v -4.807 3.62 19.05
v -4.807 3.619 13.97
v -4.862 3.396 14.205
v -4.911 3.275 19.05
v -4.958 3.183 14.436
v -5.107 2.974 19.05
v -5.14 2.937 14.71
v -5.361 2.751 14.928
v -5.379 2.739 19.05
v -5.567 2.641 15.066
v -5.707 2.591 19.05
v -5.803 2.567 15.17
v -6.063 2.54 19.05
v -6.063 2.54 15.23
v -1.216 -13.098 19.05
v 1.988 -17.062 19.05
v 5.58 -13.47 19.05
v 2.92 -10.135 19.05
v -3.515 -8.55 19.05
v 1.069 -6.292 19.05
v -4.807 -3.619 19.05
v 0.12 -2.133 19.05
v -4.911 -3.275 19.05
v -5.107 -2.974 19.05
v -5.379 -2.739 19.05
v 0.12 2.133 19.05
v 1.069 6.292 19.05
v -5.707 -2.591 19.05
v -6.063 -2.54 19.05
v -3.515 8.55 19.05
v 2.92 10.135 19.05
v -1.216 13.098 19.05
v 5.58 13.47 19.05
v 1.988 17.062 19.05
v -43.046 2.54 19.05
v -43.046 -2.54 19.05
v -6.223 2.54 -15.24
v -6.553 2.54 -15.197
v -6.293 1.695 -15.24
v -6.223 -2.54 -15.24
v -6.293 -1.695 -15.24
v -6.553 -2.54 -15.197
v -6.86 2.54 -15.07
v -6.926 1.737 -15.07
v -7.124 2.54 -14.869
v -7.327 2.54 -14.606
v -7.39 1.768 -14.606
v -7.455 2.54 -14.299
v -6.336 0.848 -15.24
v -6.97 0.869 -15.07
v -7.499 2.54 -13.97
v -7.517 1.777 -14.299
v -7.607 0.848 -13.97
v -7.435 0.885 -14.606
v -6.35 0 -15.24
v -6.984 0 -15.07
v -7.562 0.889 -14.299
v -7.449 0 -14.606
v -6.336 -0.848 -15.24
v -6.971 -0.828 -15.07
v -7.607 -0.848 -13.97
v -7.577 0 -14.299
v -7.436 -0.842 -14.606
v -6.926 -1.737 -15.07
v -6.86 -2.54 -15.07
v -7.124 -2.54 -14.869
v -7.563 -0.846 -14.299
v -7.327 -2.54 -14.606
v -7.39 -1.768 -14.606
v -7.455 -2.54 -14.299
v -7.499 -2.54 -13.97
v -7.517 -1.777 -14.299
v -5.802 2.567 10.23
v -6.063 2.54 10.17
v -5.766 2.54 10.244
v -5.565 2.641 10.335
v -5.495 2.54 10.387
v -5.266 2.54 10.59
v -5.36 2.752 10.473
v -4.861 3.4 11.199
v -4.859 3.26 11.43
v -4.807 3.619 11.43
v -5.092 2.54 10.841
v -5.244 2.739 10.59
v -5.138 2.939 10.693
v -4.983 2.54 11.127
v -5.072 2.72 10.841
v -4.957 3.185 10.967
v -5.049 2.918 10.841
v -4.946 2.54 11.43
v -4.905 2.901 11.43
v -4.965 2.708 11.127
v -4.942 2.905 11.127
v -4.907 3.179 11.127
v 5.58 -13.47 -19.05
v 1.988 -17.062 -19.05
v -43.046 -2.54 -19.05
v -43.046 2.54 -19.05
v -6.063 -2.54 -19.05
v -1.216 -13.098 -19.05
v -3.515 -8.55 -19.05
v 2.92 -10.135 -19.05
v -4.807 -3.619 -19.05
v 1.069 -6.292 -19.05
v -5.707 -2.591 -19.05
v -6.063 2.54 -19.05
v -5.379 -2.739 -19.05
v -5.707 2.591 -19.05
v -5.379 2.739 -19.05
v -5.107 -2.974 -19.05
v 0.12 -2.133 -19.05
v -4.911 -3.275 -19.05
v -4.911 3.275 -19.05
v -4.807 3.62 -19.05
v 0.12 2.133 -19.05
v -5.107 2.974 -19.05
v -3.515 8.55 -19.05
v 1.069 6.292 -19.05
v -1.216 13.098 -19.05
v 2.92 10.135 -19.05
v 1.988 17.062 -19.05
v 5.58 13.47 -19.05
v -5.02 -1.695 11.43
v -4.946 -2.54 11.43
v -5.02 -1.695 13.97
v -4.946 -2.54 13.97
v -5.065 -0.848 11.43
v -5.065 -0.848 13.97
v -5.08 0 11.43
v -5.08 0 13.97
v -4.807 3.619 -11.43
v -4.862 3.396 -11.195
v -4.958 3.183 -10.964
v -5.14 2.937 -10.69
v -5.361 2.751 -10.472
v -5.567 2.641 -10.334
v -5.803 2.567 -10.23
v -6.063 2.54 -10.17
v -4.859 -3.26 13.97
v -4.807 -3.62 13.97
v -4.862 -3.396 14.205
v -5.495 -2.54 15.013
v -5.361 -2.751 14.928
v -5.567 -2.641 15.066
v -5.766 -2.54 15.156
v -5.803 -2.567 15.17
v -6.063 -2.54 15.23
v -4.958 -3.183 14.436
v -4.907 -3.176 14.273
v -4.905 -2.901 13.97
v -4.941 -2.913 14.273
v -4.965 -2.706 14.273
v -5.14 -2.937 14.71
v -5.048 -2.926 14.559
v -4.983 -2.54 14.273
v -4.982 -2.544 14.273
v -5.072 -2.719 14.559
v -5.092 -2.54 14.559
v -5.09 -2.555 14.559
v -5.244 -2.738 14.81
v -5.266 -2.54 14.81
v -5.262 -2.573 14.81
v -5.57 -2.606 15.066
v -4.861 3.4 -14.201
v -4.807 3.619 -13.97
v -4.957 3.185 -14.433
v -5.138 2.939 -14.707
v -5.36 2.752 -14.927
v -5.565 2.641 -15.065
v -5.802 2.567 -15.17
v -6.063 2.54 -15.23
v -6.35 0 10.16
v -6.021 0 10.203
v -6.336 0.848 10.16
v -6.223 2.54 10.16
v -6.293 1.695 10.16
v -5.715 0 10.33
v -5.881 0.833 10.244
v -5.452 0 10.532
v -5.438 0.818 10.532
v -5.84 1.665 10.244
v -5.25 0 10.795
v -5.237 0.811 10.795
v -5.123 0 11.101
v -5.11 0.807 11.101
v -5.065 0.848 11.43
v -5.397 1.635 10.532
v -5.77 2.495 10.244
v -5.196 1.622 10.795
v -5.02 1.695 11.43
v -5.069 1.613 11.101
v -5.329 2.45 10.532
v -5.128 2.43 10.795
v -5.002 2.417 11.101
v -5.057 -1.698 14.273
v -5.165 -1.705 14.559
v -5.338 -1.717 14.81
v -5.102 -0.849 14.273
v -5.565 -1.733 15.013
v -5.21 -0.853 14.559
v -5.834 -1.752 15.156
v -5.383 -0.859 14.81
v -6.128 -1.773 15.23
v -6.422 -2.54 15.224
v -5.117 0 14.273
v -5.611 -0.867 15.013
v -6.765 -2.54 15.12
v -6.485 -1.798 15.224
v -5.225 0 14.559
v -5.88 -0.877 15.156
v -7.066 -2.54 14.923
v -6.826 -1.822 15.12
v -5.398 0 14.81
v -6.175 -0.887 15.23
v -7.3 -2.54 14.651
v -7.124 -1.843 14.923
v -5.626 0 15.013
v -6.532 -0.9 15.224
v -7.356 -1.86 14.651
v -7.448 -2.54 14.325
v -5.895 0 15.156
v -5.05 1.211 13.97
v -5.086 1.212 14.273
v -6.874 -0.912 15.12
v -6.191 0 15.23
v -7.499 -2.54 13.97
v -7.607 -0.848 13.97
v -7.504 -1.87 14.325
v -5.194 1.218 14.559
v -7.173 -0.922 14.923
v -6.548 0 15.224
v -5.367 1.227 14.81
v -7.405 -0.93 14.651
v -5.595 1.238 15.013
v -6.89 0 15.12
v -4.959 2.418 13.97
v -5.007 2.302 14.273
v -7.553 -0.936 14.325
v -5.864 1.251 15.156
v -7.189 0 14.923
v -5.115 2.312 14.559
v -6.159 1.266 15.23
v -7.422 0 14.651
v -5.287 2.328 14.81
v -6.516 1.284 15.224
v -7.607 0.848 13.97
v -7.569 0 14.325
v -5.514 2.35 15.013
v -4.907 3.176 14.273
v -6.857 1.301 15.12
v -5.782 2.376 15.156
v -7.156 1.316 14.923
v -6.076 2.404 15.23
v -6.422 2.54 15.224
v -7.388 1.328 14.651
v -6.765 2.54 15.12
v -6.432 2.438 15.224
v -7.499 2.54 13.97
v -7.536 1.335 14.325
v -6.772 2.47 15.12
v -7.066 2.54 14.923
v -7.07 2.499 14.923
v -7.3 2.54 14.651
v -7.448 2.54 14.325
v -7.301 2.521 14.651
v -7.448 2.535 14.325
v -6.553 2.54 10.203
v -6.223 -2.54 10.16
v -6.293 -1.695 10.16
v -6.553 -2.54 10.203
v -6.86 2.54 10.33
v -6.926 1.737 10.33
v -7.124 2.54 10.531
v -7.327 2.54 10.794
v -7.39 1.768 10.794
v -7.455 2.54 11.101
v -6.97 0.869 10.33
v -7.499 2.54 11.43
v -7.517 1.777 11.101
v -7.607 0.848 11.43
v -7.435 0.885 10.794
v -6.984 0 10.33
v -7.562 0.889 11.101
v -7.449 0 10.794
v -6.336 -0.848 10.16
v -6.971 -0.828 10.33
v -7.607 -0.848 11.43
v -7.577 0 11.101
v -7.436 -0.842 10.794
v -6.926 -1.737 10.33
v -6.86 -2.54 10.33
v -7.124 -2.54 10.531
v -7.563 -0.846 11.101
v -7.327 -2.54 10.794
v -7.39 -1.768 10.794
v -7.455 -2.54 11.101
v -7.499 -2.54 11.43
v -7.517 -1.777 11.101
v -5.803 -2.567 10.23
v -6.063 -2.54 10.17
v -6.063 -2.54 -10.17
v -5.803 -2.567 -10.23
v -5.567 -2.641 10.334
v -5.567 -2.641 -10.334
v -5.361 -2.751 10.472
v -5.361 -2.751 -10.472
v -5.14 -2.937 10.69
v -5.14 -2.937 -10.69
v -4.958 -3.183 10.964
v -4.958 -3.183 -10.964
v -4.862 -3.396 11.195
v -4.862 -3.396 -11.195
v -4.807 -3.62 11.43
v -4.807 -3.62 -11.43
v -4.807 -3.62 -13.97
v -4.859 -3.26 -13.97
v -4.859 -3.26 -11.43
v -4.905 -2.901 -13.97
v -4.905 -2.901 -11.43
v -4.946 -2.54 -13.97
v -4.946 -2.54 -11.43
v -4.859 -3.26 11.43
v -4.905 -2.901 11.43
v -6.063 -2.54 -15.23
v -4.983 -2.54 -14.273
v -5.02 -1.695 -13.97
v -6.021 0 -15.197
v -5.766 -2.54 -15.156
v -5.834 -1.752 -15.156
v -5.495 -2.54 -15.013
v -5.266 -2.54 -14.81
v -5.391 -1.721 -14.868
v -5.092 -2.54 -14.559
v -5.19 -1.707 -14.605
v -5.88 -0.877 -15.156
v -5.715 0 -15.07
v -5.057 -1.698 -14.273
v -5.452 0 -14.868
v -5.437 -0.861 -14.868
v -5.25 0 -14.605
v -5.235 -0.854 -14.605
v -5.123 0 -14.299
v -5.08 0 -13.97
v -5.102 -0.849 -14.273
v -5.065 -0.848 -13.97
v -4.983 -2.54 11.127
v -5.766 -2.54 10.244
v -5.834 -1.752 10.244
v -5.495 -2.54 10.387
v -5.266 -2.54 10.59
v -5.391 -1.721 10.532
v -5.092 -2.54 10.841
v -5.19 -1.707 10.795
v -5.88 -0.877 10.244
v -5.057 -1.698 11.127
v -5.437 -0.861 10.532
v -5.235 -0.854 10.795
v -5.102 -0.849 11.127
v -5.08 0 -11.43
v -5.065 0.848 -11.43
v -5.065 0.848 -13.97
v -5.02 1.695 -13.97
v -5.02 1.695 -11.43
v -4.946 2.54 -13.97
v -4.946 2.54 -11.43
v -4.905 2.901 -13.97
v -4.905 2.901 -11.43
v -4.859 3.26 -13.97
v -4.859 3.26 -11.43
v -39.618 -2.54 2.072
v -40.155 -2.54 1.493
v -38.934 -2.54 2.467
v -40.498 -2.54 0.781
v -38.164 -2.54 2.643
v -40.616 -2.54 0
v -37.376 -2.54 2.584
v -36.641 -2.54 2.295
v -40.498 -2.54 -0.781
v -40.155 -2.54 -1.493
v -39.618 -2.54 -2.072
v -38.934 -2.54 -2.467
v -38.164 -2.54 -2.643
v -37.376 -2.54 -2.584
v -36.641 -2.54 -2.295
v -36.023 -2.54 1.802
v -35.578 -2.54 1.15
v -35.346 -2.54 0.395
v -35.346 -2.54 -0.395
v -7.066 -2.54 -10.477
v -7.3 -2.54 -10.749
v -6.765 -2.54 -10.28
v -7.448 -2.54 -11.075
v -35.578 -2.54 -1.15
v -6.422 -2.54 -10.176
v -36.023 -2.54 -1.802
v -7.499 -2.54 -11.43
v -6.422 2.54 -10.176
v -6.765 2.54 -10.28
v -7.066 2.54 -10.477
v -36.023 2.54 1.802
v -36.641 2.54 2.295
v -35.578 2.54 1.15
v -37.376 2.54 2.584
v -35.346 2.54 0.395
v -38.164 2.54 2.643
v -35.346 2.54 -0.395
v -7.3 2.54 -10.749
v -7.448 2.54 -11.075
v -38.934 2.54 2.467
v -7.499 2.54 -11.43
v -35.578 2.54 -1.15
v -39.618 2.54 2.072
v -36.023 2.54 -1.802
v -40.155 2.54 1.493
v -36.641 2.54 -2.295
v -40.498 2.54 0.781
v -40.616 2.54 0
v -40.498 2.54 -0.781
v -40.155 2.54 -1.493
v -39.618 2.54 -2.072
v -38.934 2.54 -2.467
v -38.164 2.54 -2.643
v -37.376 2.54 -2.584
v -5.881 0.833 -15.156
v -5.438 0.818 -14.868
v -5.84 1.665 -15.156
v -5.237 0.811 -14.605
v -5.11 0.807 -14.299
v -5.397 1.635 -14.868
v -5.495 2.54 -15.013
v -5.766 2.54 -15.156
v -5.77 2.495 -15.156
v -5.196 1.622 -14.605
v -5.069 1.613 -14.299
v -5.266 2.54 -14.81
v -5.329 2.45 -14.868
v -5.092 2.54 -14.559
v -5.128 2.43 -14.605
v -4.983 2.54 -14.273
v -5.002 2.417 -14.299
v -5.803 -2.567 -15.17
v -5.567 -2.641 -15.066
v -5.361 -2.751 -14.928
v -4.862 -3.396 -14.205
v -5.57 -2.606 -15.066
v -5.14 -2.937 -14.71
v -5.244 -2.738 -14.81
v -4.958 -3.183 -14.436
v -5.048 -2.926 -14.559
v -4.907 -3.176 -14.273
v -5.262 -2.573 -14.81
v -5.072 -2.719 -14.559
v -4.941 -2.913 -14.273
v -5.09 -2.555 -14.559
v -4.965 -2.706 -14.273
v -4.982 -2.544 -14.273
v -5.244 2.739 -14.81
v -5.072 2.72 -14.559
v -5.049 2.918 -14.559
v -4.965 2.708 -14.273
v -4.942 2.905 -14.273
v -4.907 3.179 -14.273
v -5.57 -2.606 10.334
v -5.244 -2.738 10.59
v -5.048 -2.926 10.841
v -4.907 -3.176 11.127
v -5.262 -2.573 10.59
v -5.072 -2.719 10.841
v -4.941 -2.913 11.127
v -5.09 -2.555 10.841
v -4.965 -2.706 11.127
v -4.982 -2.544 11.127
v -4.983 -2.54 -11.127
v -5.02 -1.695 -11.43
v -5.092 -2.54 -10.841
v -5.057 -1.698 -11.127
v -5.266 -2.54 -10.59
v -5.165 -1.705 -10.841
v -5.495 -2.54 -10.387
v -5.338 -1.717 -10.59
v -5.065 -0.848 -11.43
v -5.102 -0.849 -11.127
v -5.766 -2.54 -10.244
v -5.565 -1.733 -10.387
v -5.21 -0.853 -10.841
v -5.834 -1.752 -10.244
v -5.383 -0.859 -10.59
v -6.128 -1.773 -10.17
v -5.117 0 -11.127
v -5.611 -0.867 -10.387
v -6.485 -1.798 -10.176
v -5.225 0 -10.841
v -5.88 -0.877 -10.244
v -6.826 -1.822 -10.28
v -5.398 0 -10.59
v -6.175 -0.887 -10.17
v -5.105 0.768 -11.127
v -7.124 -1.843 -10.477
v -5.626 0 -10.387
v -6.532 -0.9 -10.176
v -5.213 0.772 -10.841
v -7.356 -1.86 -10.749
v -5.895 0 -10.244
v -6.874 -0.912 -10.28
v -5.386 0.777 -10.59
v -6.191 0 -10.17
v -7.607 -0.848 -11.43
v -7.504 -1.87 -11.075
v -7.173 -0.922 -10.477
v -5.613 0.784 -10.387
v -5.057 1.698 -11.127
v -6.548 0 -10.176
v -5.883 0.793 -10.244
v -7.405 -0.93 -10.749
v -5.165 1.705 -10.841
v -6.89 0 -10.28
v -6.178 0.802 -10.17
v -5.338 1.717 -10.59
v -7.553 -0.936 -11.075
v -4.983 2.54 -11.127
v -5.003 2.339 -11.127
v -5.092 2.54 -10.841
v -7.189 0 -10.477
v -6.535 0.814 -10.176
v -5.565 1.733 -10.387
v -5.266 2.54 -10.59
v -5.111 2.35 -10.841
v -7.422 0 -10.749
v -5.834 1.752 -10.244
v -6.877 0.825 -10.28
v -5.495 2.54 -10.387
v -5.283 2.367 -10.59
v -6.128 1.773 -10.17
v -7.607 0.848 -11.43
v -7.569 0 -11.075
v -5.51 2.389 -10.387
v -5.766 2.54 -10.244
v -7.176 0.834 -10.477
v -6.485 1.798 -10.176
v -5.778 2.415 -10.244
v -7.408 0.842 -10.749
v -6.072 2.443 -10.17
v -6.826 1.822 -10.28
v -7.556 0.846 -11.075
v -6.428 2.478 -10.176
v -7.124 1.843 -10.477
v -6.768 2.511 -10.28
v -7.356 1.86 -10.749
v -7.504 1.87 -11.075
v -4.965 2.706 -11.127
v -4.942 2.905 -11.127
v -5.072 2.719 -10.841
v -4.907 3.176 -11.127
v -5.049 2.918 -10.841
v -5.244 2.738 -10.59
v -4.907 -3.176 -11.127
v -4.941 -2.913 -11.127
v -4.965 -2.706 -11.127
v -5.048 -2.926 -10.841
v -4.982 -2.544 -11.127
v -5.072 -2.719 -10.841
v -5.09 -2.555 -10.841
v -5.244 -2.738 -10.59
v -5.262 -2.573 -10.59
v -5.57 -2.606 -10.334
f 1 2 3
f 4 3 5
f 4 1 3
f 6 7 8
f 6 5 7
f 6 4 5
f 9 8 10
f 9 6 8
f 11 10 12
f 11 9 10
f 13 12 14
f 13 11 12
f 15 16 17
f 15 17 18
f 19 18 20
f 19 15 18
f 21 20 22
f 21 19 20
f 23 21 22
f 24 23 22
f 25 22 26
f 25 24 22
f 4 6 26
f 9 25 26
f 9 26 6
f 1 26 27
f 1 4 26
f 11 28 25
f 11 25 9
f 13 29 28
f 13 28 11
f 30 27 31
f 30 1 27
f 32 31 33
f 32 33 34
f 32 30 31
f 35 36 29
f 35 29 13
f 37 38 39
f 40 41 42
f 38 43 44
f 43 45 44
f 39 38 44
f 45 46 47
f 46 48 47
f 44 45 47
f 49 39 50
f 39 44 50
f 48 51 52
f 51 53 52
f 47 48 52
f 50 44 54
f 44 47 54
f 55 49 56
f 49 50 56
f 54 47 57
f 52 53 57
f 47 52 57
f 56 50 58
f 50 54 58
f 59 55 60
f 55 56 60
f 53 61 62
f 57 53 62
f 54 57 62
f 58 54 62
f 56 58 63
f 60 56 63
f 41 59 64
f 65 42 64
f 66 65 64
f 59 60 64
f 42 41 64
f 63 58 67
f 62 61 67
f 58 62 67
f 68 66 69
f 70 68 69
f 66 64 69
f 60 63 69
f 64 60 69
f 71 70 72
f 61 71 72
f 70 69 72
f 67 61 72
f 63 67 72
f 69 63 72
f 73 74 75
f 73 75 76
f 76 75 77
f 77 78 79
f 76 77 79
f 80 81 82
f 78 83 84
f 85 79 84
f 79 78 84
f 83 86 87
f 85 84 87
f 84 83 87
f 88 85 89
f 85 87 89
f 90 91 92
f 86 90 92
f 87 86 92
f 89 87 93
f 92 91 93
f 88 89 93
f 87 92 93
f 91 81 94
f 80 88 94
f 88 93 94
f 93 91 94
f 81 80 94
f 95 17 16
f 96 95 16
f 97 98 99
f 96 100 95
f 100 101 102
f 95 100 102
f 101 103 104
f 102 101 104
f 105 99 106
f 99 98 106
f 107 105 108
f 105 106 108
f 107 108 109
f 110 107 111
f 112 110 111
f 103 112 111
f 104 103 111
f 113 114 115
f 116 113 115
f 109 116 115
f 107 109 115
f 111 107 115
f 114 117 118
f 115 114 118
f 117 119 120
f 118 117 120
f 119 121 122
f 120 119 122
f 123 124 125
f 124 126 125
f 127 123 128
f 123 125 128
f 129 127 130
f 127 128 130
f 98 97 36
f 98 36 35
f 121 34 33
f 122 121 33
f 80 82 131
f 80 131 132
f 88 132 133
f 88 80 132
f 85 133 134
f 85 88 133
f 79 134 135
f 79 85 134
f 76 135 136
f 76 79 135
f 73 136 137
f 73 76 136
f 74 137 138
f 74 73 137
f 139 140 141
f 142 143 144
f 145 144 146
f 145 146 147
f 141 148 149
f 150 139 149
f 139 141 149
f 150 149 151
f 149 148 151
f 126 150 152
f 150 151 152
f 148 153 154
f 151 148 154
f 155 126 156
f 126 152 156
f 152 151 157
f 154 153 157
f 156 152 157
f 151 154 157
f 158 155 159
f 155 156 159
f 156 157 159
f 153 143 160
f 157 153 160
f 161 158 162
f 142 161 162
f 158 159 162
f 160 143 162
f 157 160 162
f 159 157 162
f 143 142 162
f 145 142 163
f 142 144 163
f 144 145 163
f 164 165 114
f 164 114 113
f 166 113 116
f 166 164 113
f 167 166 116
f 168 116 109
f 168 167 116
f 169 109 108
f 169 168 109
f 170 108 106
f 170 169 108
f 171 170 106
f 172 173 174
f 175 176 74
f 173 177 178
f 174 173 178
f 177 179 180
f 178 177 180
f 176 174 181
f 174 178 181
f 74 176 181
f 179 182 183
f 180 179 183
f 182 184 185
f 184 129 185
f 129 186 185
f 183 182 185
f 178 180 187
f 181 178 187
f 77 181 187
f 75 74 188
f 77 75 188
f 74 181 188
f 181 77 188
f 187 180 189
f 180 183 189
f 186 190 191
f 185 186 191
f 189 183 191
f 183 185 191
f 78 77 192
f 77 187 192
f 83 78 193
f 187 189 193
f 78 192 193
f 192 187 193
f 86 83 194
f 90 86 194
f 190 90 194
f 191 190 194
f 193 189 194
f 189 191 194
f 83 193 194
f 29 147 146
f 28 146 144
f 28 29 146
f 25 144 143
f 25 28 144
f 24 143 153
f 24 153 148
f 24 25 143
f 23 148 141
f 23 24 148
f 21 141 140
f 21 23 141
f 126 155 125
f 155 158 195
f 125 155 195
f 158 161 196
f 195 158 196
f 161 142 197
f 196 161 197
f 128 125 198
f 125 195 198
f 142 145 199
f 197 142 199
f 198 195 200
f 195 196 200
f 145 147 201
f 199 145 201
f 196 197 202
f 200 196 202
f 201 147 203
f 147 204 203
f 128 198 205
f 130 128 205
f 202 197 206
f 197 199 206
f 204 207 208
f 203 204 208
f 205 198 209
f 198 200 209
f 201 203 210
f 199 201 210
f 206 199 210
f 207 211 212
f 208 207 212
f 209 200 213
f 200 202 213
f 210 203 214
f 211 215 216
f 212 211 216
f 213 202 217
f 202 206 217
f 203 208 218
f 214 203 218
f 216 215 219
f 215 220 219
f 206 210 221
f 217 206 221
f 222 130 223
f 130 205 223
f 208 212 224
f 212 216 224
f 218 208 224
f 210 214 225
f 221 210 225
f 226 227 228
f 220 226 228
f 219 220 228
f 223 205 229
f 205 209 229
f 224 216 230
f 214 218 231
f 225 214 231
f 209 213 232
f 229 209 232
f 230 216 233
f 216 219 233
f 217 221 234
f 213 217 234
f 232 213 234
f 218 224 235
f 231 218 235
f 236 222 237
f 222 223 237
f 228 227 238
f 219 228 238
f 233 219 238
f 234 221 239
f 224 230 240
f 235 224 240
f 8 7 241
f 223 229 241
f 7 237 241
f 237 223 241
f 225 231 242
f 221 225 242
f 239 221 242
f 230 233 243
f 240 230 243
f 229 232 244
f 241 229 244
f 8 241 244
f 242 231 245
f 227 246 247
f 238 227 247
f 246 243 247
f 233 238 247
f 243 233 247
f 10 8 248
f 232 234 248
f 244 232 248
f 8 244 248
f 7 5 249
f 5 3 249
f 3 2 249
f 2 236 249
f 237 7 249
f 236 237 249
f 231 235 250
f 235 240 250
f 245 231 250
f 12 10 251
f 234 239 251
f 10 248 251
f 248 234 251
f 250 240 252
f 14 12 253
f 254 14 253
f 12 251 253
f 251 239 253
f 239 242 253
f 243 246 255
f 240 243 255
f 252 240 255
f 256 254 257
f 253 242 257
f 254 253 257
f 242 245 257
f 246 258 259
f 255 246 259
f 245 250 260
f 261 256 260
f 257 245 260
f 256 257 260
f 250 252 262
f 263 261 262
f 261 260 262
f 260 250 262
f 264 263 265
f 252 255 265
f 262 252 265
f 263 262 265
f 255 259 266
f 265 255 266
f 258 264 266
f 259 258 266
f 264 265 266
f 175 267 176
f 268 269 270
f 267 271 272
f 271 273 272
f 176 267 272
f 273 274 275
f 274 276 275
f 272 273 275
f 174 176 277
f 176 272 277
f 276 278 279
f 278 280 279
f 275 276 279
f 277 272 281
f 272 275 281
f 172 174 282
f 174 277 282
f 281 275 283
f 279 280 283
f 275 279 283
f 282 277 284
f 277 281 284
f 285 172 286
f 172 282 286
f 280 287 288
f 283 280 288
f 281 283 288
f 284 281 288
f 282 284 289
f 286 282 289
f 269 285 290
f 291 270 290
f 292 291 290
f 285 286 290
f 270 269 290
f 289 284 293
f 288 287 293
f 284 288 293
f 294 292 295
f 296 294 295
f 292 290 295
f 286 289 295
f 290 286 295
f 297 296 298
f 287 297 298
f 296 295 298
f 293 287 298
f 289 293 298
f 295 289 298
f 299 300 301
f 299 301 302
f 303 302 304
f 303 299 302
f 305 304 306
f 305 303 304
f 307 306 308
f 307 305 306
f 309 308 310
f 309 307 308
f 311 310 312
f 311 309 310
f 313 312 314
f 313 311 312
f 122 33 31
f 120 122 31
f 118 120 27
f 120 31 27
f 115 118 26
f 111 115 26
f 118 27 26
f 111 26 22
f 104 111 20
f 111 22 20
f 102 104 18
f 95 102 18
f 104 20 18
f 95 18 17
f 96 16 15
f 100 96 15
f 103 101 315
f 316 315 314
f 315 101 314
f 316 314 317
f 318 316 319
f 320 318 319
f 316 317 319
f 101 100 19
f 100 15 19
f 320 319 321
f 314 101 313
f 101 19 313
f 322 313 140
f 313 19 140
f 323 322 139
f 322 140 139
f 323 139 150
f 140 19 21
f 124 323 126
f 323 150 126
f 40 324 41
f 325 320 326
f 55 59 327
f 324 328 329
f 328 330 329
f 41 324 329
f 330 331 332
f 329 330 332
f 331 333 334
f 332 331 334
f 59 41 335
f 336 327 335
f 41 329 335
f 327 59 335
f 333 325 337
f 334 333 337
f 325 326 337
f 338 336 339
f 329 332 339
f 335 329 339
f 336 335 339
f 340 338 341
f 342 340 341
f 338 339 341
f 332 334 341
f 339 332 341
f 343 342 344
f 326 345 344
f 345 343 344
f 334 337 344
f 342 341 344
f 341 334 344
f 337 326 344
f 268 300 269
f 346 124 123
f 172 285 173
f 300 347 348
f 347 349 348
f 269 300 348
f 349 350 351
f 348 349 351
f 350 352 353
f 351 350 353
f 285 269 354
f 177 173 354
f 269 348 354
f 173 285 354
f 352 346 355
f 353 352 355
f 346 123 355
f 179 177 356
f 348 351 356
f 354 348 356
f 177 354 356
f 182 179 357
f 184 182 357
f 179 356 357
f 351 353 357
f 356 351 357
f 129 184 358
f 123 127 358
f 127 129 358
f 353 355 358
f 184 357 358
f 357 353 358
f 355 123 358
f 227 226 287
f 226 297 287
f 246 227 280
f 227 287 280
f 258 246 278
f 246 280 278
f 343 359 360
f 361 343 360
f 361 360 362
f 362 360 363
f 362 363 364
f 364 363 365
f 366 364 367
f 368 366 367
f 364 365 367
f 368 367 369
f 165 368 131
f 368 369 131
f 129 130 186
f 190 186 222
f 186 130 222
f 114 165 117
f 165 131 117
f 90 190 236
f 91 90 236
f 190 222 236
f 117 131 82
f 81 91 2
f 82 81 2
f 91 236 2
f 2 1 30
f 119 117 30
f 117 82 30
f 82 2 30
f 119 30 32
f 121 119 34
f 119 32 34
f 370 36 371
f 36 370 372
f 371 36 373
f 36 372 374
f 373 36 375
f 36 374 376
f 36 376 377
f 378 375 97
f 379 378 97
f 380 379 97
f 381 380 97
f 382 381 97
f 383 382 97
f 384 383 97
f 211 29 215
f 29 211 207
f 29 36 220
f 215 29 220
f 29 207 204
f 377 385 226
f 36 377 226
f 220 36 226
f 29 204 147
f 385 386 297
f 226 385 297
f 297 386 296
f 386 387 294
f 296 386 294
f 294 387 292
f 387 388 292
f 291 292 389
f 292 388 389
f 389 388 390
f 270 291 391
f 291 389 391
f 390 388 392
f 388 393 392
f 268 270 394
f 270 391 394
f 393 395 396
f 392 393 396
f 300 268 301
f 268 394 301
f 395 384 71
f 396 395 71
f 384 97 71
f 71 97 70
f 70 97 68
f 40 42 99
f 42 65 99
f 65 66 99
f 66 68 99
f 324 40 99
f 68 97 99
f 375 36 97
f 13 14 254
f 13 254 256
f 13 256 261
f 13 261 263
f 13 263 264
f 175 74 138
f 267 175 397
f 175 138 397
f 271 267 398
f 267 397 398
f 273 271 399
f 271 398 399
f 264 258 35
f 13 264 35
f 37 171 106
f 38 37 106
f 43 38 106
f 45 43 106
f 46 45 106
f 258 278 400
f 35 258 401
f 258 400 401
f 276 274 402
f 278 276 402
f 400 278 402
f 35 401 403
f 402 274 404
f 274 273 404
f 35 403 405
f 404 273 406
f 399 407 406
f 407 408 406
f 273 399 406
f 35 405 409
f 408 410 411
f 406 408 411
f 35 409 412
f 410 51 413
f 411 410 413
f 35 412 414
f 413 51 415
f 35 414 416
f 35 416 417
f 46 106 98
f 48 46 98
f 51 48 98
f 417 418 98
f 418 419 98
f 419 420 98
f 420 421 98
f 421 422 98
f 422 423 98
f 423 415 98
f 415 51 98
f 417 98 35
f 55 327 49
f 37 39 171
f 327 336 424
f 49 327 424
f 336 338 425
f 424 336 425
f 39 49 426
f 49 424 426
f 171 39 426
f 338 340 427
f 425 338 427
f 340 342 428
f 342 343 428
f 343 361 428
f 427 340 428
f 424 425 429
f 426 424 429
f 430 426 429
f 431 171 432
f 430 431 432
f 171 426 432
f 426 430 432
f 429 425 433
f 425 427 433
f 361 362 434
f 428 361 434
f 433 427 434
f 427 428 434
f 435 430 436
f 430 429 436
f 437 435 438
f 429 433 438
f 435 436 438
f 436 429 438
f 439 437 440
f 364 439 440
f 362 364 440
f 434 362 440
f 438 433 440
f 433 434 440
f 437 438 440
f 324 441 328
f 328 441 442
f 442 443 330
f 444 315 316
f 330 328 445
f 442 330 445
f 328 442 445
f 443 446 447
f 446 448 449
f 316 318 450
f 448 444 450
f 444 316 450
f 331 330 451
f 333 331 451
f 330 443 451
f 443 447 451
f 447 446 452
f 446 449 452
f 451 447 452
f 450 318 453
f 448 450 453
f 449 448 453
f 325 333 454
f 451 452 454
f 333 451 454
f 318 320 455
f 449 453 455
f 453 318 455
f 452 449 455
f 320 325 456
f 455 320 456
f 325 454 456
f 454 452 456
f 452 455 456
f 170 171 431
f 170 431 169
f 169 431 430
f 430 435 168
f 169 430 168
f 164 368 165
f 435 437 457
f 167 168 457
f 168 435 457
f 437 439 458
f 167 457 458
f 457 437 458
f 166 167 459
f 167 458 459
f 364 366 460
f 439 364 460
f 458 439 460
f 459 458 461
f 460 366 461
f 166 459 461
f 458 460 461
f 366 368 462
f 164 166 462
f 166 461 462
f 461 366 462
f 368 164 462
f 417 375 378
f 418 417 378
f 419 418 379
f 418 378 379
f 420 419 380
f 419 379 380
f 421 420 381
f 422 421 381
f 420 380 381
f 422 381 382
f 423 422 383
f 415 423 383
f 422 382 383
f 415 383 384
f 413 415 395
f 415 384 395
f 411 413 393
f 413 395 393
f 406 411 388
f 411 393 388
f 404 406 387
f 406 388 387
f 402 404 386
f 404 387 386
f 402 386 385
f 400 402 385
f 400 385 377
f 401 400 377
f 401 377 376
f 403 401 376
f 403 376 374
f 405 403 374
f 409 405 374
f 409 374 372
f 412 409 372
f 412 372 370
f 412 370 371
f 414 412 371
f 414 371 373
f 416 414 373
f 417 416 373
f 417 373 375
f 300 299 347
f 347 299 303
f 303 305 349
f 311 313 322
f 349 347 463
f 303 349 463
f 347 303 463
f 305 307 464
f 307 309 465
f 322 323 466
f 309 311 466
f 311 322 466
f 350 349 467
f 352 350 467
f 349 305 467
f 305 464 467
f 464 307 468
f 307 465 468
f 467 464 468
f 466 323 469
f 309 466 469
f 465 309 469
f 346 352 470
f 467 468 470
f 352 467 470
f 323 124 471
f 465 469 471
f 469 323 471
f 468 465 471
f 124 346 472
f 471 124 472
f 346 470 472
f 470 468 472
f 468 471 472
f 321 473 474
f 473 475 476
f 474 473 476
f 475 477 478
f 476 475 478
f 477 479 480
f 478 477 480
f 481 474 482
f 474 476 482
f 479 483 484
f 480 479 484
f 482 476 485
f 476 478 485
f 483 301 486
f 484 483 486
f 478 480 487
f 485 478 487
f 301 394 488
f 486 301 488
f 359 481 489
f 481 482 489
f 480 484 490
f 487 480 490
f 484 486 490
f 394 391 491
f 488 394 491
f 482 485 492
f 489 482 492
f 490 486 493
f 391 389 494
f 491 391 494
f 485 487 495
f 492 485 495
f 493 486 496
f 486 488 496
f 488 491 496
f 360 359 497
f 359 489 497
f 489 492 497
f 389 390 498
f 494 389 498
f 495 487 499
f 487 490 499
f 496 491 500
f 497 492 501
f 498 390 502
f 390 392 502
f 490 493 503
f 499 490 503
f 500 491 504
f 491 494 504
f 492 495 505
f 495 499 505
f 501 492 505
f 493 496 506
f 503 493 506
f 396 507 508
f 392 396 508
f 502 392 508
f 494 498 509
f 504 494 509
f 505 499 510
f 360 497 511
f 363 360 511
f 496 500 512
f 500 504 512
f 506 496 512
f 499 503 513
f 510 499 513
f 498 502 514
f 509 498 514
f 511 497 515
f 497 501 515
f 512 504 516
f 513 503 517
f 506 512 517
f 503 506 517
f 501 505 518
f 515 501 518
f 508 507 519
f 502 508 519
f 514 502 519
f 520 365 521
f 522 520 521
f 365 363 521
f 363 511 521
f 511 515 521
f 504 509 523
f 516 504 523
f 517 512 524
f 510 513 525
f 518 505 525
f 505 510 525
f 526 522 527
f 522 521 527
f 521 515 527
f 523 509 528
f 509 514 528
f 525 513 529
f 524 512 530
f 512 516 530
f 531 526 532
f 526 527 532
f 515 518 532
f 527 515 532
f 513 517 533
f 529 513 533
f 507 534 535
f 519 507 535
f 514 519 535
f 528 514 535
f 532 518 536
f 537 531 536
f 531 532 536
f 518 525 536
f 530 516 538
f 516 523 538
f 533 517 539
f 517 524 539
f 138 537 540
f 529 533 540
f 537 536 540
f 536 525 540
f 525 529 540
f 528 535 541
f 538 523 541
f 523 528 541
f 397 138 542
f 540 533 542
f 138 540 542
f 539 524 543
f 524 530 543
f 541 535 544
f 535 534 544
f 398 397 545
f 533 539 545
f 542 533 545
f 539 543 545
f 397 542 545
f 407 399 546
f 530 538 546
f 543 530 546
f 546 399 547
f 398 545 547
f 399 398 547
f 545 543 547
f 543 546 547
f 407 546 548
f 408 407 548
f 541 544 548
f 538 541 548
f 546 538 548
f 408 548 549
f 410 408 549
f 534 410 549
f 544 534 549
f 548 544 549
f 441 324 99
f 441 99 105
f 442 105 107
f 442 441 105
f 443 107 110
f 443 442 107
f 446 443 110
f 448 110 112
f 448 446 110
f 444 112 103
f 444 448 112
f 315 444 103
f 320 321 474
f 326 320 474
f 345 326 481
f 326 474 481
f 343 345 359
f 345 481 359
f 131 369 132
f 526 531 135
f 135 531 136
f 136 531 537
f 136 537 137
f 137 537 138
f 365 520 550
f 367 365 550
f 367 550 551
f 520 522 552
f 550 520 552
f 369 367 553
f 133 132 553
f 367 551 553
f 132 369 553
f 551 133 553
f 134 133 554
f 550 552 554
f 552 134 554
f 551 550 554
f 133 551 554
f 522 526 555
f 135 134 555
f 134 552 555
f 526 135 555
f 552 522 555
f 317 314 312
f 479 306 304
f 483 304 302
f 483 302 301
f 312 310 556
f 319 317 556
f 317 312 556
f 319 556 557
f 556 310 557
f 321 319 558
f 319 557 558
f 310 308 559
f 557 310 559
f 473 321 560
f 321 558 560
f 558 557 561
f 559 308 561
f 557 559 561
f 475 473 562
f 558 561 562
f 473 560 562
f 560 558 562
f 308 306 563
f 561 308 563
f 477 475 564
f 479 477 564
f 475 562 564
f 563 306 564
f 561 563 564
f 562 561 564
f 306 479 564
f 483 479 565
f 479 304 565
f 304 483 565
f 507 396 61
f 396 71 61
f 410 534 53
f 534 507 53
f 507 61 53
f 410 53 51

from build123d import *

# Parameters (mm, degrees)
BOSS_EXTRUDE1_DEPTH  = 19.05
M5_CLEARANCE_HOLE1_D = 5.3
FILLET1_R            = 1.27


with BuildPart() as part:
    # Sketch1 → Boss-Extrude1 (new, symmetric)
    with BuildSketch(Plane.XY):
        with BuildLine():
            Line((5.57961581839625, -13.470384181603707), (1.987513369968585, -17.06248663003137))
            ThreePointArc((1.987513369968585, -17.06248663003137), (-2.725544166788481, -10.39627703749012), (-4.945943407167808, -2.539999999999996))
            Line((-4.945943407167808, -2.539999999999996), (-43.04594340716781, -2.540000000000002))
            Line((-43.04594340716781, -2.540000000000002), (-43.04594340716781, 2.5399999999999987))
            Line((-43.04594340716781, 2.5399999999999987), (-4.945943407167809, 2.5399999999999956))
            ThreePointArc((-4.945943407167809, 2.5399999999999956), (-2.7255441667884845, 10.39627703749011), (1.9875133699685803, 17.062486630031362))
            Line((1.9875133699685803, 17.062486630031362), (5.57961581839625, 13.470384181603707))
            ThreePointArc((5.57961581839625, 13.470384181603707), (0, -2.33e-15), (5.57961581839625, -13.470384181603707))
        make_face()
    extrude(amount=BOSS_EXTRUDE1_DEPTH, both=True)

    # Sketch3 → Cut-Revolve1 (revolve, cut)
    with BuildSketch(Plane(origin=(0, 0, 0), x_dir=(1, 0, 0), z_dir=(0, 1, 0))):
        Polygon((-5.080000000000001, 15.239999999999998), (-5.079999999999999, 10.159999999999997), (-7.619999999999999, 10.159999999999995), (-7.620000000000001, 15.239999999999998), align=None)
        Polygon((-7.6200000000000045, -15.239999999999998), (-7.620000000000003, -10.159999999999995), (-5.080000000000003, -10.159999999999997), (-5.0800000000000045, -15.239999999999998), align=None)
    revolve(axis=Axis((19.049999999999997, 0, 19.05), (0, 0, -1)), mode=Mode.SUBTRACT)

    # M5 Clearance Hole1 (through all)
    with Locations(Plane(origin=(2.3e-16, 2.539999999999995, 0), x_dir=(1, -1.3e-15, 0), z_dir=(1.3e-15, 1, 0))):
        with Locations((-37.965943407, 0)):
            Hole(M5_CLEARANCE_HOLE1_D / 2)

    # Fillet1
    # the kernel refuses this fillet: 1.27 mm, written as the material it adds along each edge
    with BuildSketch(Plane(origin=(19.049999999999997, 0, 10.159999999999995), x_dir=(-0.977097634311174, 0.21279147779811838, 0), z_dir=(0.21279147779811838, 0.977097634311174, 0))) as fillet1_piece_1_section:
        with BuildLine():
            CenterArc((26.669999999999998 - FILLET1_R, FILLET1_R), FILLET1_R, 270, 90)
            Line((26.669999999999998, FILLET1_R), (26.669999999999998, 0))
            Line((26.669999999999998, 0), (26.669999999999998 - FILLET1_R, 0))
        make_face()
    fillet1_piece_1 = revolve(axis=Axis((19.049999999999997, 0, 10.159999999999995), (0, 0, 1)), revolution_arc=24.571980666955447, mode=Mode.PRIVATE)
    fillet1_piece_1 = split(fillet1_piece_1, bisect_by=Plane(origin=(-7.291599900953605, -2.5399999999999965, 10.447516445841947), z_dir=(-1.5e-16, 1, 0)), keep=Keep.TOP, mode=Mode.PRIVATE)
    fillet1_piece_1 = split(fillet1_piece_1, bisect_by=Plane(origin=(-7.2915999009536066, 2.5399999999999956, 10.447516445841947), z_dir=(-8e-17, -1, 0)), keep=Keep.TOP, mode=Mode.PRIVATE)
    add(fillet1_piece_1)
    with BuildSketch(Plane(origin=(19.049999999999997, 0, 10.159999999999997), x_dir=(-0.97203785589273, -0.23482420384505578, 0), z_dir=(0.23482420384505578, -0.97203785589273, 0))) as fillet1_piece_2_section:
        with BuildLine():
            CenterArc((24.130000000000003 + FILLET1_R, -FILLET1_R), FILLET1_R, 90, 90)
            Line((24.130000000000003 + FILLET1_R, 1.78e-15), (24.130000000000003, 1.78e-15))
            Line((24.130000000000003, 1.78e-15), (24.130000000000003, -FILLET1_R))
        make_face()
    fillet1_piece_2 = revolve(axis=Axis((19.049999999999997, 0, 10.159999999999997), (0, 0, -1)), revolution_arc=13.581260422554433, mode=Mode.PRIVATE)
    fillet1_piece_2 = split(fillet1_piece_2, bisect_by=Plane(origin=(-5.323332867248744, -2.539999999999996, 10.44752827133116), z_dir=(-1.5e-16, 1, 0)), keep=Keep.TOP, mode=Mode.PRIVATE)
    add(fillet1_piece_2)
    with BuildSketch(Plane(origin=(19.049999999999997, 0, 15.239999999999998), x_dir=(-1, 0, 0), z_dir=(0, -1, 0))) as fillet1_piece_3_section:
        with BuildLine():
            CenterArc((24.130000000000003 + FILLET1_R, FILLET1_R), FILLET1_R, 180, 90.00000000000017)
            Line((24.130000000000003 + FILLET1_R, 0), (24.130000000000003, 0))
            Line((24.130000000000003, 0), (24.13, FILLET1_R))
        make_face()
    fillet1_piece_3 = revolve(axis=Axis((19.049999999999997, 0, 15.239999999999998), (0, 0, -1)), revolution_arc=13.581260422554424, mode=Mode.PRIVATE)
    fillet1_piece_3 = split(fillet1_piece_3, bisect_by=Plane(origin=(-5.3233331057064674, 2.5399999999999956, 14.952471726792393), z_dir=(-8e-17, -1, 0)), keep=Keep.TOP, mode=Mode.PRIVATE)
    add(fillet1_piece_3)
    with BuildSketch(Plane(origin=(19.049999999999997, 0, 15.239999999999998), x_dir=(-0.977097634311174, 0.21279147779811838, 0), z_dir=(0.21279147779811838, 0.977097634311174, 0))) as fillet1_piece_4_section:
        with BuildLine():
            CenterArc((26.669999999999998 - FILLET1_R, -FILLET1_R), FILLET1_R, 0, 90)
            Line((26.669999999999998, -FILLET1_R), (26.669999999999998, 0))
            Line((26.669999999999998, 0), (26.669999999999998 - FILLET1_R, 0))
        make_face()
    fillet1_piece_4 = revolve(axis=Axis((19.049999999999997, 0, 15.239999999999998), (0, 0, 1)), revolution_arc=24.571980666955447, mode=Mode.PRIVATE)
    fillet1_piece_4 = split(fillet1_piece_4, bisect_by=Plane(origin=(-7.2915999009536066, -2.5399999999999965, 14.952483554158047), z_dir=(-1.5e-16, 1, 0)), keep=Keep.TOP, mode=Mode.PRIVATE)
    fillet1_piece_4 = split(fillet1_piece_4, bisect_by=Plane(origin=(-7.2915999009536066, 2.5399999999999956, 14.952483554158047), z_dir=(-8e-17, -1, 0)), keep=Keep.TOP, mode=Mode.PRIVATE)
    add(fillet1_piece_4)
    with BuildSketch(Plane(origin=(19.049999999999997, 0, -10.159999999999997), x_dir=(-0.9720378558927297, -0.23482420384505664, 0), z_dir=(0.23482420384505664, -0.9720378558927297, 0))) as fillet1_piece_5_section:
        with BuildLine():
            CenterArc((24.129999999999995 + FILLET1_R, FILLET1_R), FILLET1_R, 180, 90)
            Line((24.129999999999995 + FILLET1_R, 0), (24.129999999999995, 0))
            Line((24.129999999999995, 0), (24.129999999999995, FILLET1_R))
        make_face()
    fillet1_piece_5 = revolve(axis=Axis((19.049999999999997, 0, -10.159999999999997), (0, 0, -1)), revolution_arc=13.581260422554445, mode=Mode.PRIVATE)
    fillet1_piece_5 = split(fillet1_piece_5, bisect_by=Plane(origin=(-5.32333286724874, -2.539999999999996, -10.447528271331164), z_dir=(-1.5e-16, 1, 0)), keep=Keep.TOP, mode=Mode.PRIVATE)
    add(fillet1_piece_5)
    with BuildSketch(Plane(origin=(19.049999999999997, 0, -10.159999999999993), x_dir=(-0.9770976343111741, 0.2127914777981185, 0), z_dir=(0.2127914777981185, 0.9770976343111741, 0))) as fillet1_piece_6_section:
        with BuildLine():
            CenterArc((26.669999999999995 - FILLET1_R, -FILLET1_R), FILLET1_R, 0, 90)
            Line((26.669999999999995 - FILLET1_R, -3.55e-15), (26.669999999999995, -3.55e-15))
            Line((26.669999999999995, -3.55e-15), (26.669999999999995, -FILLET1_R))
        make_face()
    fillet1_piece_6 = revolve(axis=Axis((19.049999999999997, 0, -10.159999999999993), (0, 0, 1)), revolution_arc=24.571980666955454, mode=Mode.PRIVATE)
    fillet1_piece_6 = split(fillet1_piece_6, bisect_by=Plane(origin=(-7.291599896838221, -2.5399999999999965, -10.447516449246772), z_dir=(-1.5e-16, 1, 0)), keep=Keep.TOP, mode=Mode.PRIVATE)
    fillet1_piece_6 = split(fillet1_piece_6, bisect_by=Plane(origin=(-7.291599896838221, 2.5399999999999956, -10.447516449246772), z_dir=(-8e-17, -1, 0)), keep=Keep.TOP, mode=Mode.PRIVATE)
    add(fillet1_piece_6)
    with BuildSketch(Plane(origin=(19.049999999999997, 0, -15.239999999999998), x_dir=(-0.9770976343111741, 0.21279147779811852, 0), z_dir=(0.21279147779811852, 0.9770976343111741, 0))) as fillet1_piece_7_section:
        with BuildLine():
            CenterArc((26.669999999999995 - FILLET1_R, FILLET1_R), FILLET1_R, 270, 90)
            Line((26.669999999999995, FILLET1_R), (26.669999999999995, 0))
            Line((26.669999999999995, 0), (26.669999999999995 - FILLET1_R, 0))
        make_face()
    fillet1_piece_7 = revolve(axis=Axis((19.049999999999997, 0, -15.239999999999998), (0, 0, 1)), revolution_arc=24.57198066695545, mode=Mode.PRIVATE)
    fillet1_piece_7 = split(fillet1_piece_7, bisect_by=Plane(origin=(-7.291599900953608, -2.5399999999999965, -14.952483554158045), z_dir=(-1.5e-16, 1, 0)), keep=Keep.TOP, mode=Mode.PRIVATE)
    fillet1_piece_7 = split(fillet1_piece_7, bisect_by=Plane(origin=(-7.2915999009536066, 2.5399999999999956, -14.952483554158045), z_dir=(-8e-17, -1, 0)), keep=Keep.TOP, mode=Mode.PRIVATE)
    add(fillet1_piece_7)
    with BuildSketch(Plane(origin=(19.049999999999997, 0, -15.239999999999998), x_dir=(-1, 0, 0), z_dir=(0, -1, 0))) as fillet1_piece_8_section:
        with BuildLine():
            CenterArc((24.13 + FILLET1_R, -FILLET1_R), FILLET1_R, 90, 90)
            Line((24.13 + FILLET1_R, 0), (24.13, 0))
            Line((24.13, 0), (24.13, -FILLET1_R))
        make_face()
    fillet1_piece_8 = revolve(axis=Axis((19.049999999999997, 0, -15.239999999999998), (0, 0, -1)), revolution_arc=13.581260422554415, mode=Mode.PRIVATE)
    fillet1_piece_8 = split(fillet1_piece_8, bisect_by=Plane(origin=(-5.3233331057064674, 2.5399999999999956, -14.952471726792393), z_dir=(-8e-17, -1, 0)), keep=Keep.TOP, mode=Mode.PRIVATE)
    add(fillet1_piece_8)
    with BuildSketch(Plane(origin=(-4.945943407167807, -2.539999999999996, 10.159999999999997), x_dir=(0.12766405034714182, -0.9918174682112442, 0), z_dir=(0, 0, -1))) as fillet1_piece_9:
        with BuildLine():
            CenterArc((1.1170481769540845, 1.2696769750168004), FILLET1_R, 187.33462748878583, 81.3730734414022)
            Line((-0.1425600076744228, 1.107543631077695), (0, 0))
            ThreePointArc((0, 0), (0.5442029580032722, 0.00613747468079426), (1.088405916006544, -2e-17))
        make_face()
    extrude(amount=20.319999999999993)
    with BuildSketch(Plane(origin=(-4.945943407167807, -2.539999999999996, 19.05), x_dir=(0.12766405034714182, -0.9918174682112442, 0), z_dir=(0, 0, -1)), Plane(origin=(-4.945943407167807, -2.539999999999996, -15.239999999999998), x_dir=(0.12766405034714182, -0.9918174682112442, 0), z_dir=(0, 0, -1))) as fillet1_piece_10:
        with BuildLine():
            CenterArc((1.1170481769540845, 1.2696769750168004), FILLET1_R, 187.33462748878583, 81.3730734414022)
            Line((-0.1425600076744228, 1.107543631077695), (0, 0))
            ThreePointArc((0, 0), (0.5442029580032722, 0.00613747468079426), (1.088405916006544, -2e-17))
        make_face()
    extrude(amount=3.8100000000000023)
    with BuildSketch(Plane(origin=(-4.9459434071678094, 2.5399999999999956, -15.239999999999998), x_dir=(-1, 0, 0), z_dir=(0, 0, -1)), Plane(origin=(-4.9459434071678094, 2.5399999999999956, 19.05), x_dir=(-1, 0, 0), z_dir=(0, 0, -1))) as fillet1_piece_11:
        with BuildLine():
            CenterArc((1.1166809081061766, 1.27), FILLET1_R, 188.62692655867798, 81.37307344132205)
            ThreePointArc((-0.138950307657435, 1.0795000000000146), (-0.06338789923048704, 0.5405335348765443), (0, 0))
            Line((0, 0), (1.1166809081061766, 0))
        make_face()
    extrude(amount=3.8100000000000023)
    with BuildSketch(Plane(origin=(-4.9459434071678094, 2.5399999999999956, 10.159999999999997), x_dir=(-1, 0, 0), z_dir=(0, 0, -1))) as fillet1_piece_12:
        with BuildLine():
            CenterArc((1.1166809081061766, 1.27), FILLET1_R, 188.62692655867798, 81.37307344132205)
            ThreePointArc((-0.138950307657435, 1.0795000000000146), (-0.06338789923048704, 0.5405335348765443), (0, 0))
            Line((0, 0), (1.1166809081061766, 0))
        make_face()
    extrude(amount=20.319999999999993)
    with BuildSketch(Plane(origin=(19.049999999999997, 0, -15.239999999999998), x_dir=(-0.97203785589273, -0.23482420384505578, 0), z_dir=(0.23482420384505578, -0.97203785589273, 0))) as fillet1_piece_13_section:
        with BuildLine():
            CenterArc((24.130000000000003 + FILLET1_R, -FILLET1_R), FILLET1_R, 90, 90)
            Line((24.130000000000003 + FILLET1_R, 0), (24.130000000000003, 0))
            Line((24.130000000000003, 0), (24.130000000000003, -FILLET1_R))
        make_face()
    fillet1_piece_13 = revolve(axis=Axis((19.049999999999997, 0, -15.239999999999998), (0, 0, -1)), revolution_arc=13.581260422554433, mode=Mode.PRIVATE)
    fillet1_piece_13 = split(fillet1_piece_13, bisect_by=Plane(origin=(-5.323332867248744, -2.539999999999996, -14.952471728668833), z_dir=(-1.5e-16, 1, 0)), keep=Keep.TOP, mode=Mode.PRIVATE)
    add(fillet1_piece_13)
    with BuildSketch(Plane(origin=(19.049999999999997, 0, -10.159999999999997), x_dir=(-1, 0, 0), z_dir=(0, -1, 0))) as fillet1_piece_14_section:
        with BuildLine():
            CenterArc((24.129999999999995 + FILLET1_R, FILLET1_R), FILLET1_R, 180, 89.99999999999983)
            Line((24.129999999999995 + FILLET1_R, 0), (24.129999999999995, 0))
            Line((24.129999999999995, 0), (24.13, FILLET1_R))
        make_face()
    fillet1_piece_14 = revolve(axis=Axis((19.049999999999997, 0, -10.159999999999997), (0, 0, -1)), revolution_arc=13.581260422554427, mode=Mode.PRIVATE)
    fillet1_piece_14 = split(fillet1_piece_14, bisect_by=Plane(origin=(-5.32333310570646, 2.5399999999999956, -10.447528273207606), z_dir=(-8e-17, -1, 0)), keep=Keep.TOP, mode=Mode.PRIVATE)
    add(fillet1_piece_14)
    with BuildSketch(Plane(origin=(19.049999999999997, 0, 15.239999999999998), x_dir=(-0.9720378558927298, -0.23482420384505664, 0), z_dir=(0.23482420384505664, -0.9720378558927298, 0))) as fillet1_piece_15_section:
        with BuildLine():
            CenterArc((24.130000000000003 + FILLET1_R, FILLET1_R), FILLET1_R, 180, 90)
            Line((24.130000000000003 + FILLET1_R, 0), (24.130000000000003, 0))
            Line((24.130000000000003, 0), (24.130000000000003, FILLET1_R))
        make_face()
    fillet1_piece_15 = revolve(axis=Axis((19.049999999999997, 0, 15.239999999999998), (0, 0, -1)), revolution_arc=13.581260422554445, mode=Mode.PRIVATE)
    fillet1_piece_15 = split(fillet1_piece_15, bisect_by=Plane(origin=(-5.323332867248749, -2.539999999999996, 14.952471728668836), z_dir=(-1.5e-16, 1, 0)), keep=Keep.TOP, mode=Mode.PRIVATE)
    add(fillet1_piece_15)
    with BuildSketch(Plane(origin=(19.049999999999997, 0, 10.159999999999997), x_dir=(-1, 0, 0), z_dir=(0, -1, 0))) as fillet1_piece_16_section:
        with BuildLine():
            CenterArc((24.13 + FILLET1_R, -FILLET1_R), FILLET1_R, 90, 90)
            Line((24.13 + FILLET1_R, 0), (24.13, 0))
            Line((24.13, 0), (24.13, -FILLET1_R))
        make_face()
    fillet1_piece_16 = revolve(axis=Axis((19.049999999999997, 0, 10.159999999999997), (0, 0, -1)), revolution_arc=13.581260422554415, mode=Mode.PRIVATE)
    fillet1_piece_16 = split(fillet1_piece_16, bisect_by=Plane(origin=(-5.3233331057064674, 2.5399999999999956, 10.447528273207606), z_dir=(-8e-17, -1, 0)), keep=Keep.TOP, mode=Mode.PRIVATE)
    add(fillet1_piece_16)
    with BuildSketch(Plane(origin=(-4.945943407167807, -2.539999999999996, 12.951702270265507), x_dir=(0.12766405034714182, -0.9918174682112442, 0), z_dir=(0, 0, -1))) as fillet1_piece_17a_section:
        with BuildLine():
            CenterArc((1.1170481769540845, 1.2696769750168004), FILLET1_R, 187.33462748878583, 81.3730734414022)
            Line((-0.1425600076744228, 1.107543631077695), (0, 0))
            ThreePointArc((0, 0), (0.5442029580032722, 0.00613747468079426), (1.088405916006544, -2e-17))
        make_face()
    fillet1_piece_17a = extrude(amount=23.111702270265504, mode=Mode.PRIVATE)
    fillet1_piece_17a = split(fillet1_piece_17a, bisect_by=Plane(origin=(-5.169208228517128, -2.781117736430252, 10.159999999999995), z_dir=(0, 0, 1)), keep=Keep.TOP, mode=Mode.PRIVATE)
    with BuildSketch(Plane(origin=(19.049999999999997, 0, 10.159999999999997), x_dir=(-0.97203785589273, -0.23482420384505578, 0), z_dir=(0.23482420384505578, -0.97203785589273, 0))) as fillet1_piece_17b_section:
        with BuildLine():
            CenterArc((24.130000000000003 + FILLET1_R, -FILLET1_R), FILLET1_R, 90, 90)
            Line((24.130000000000003 + FILLET1_R, 1.78e-15), (24.130000000000003, 1.78e-15))
            Line((24.130000000000003, 1.78e-15), (24.130000000000003, -FILLET1_R))
        make_face()
    fillet1_piece_17b = revolve(axis=Axis((19.049999999999997, 0, 10.159999999999997), (0, 0, -1)), revolution_arc=13.581260422554433, mode=Mode.PRIVATE)
    fillet1_piece_17b = split(fillet1_piece_17b, bisect_by=Plane(origin=(-5.000706985946909, -2.539999999999996, 10.444279944253609), z_dir=(1.5e-16, -1, 0)), keep=Keep.TOP, mode=Mode.PRIVATE)
    fillet1_piece_17 = fillet1_piece_17a & fillet1_piece_17b
    add(fillet1_piece_17)
    with BuildSketch(Plane(origin=(-4.9459434071678094, 2.5399999999999956, 19.05), x_dir=(-1, 0, 0), z_dir=(0, 0, -1))) as fillet1_piece_18a_section:
        with BuildLine():
            CenterArc((1.1166809081061766, 1.27), FILLET1_R, 188.62692655867798, 81.37307344132205)
            ThreePointArc((-0.138950307657435, 1.0795000000000146), (-0.06338789923048704, 0.5405335348765443), (0, 0))
            Line((0, 0), (1.1166809081061766, 0))
        make_face()
    fillet1_piece_18a = extrude(amount=6.601702270265445, mode=Mode.PRIVATE)
    fillet1_piece_18a = split(fillet1_piece_18a, bisect_by=Plane(origin=(-5.169208228517213, 2.781117736431367, 15.239999999999998), z_dir=(0, 0, -1)), keep=Keep.TOP, mode=Mode.PRIVATE)
    with BuildSketch(Plane(origin=(19.049999999999997, 0, 15.239999999999998), x_dir=(-1, 0, 0), z_dir=(0, -1, 0))) as fillet1_piece_18b_section:
        with BuildLine():
            CenterArc((24.130000000000003 + FILLET1_R, FILLET1_R), FILLET1_R, 180, 90.00000000000017)
            Line((24.130000000000003 + FILLET1_R, 0), (24.130000000000003, 0))
            Line((24.130000000000003, 0), (24.13, FILLET1_R))
        make_face()
    fillet1_piece_18b = revolve(axis=Axis((19.049999999999997, 0, 15.239999999999998), (0, 0, -1)), revolution_arc=13.581260422554424, mode=Mode.PRIVATE)
    fillet1_piece_18b = split(fillet1_piece_18b, bisect_by=Plane(origin=(-5.000706512259434, 2.5399999999999956, 14.955719927842757), z_dir=(8e-17, 1, 0)), keep=Keep.TOP, mode=Mode.PRIVATE)
    fillet1_piece_18 = fillet1_piece_18a & fillet1_piece_18b
    add(fillet1_piece_18)
    with BuildSketch(Plane(origin=(-4.945943407167807, -2.539999999999996, 10.159999999999997), x_dir=(0.12766405034714182, -0.9918174682112442, 0), z_dir=(0, 0, -1))) as fillet1_piece_19a_section:
        with BuildLine():
            CenterArc((1.1170481769540845, 1.2696769750168004), FILLET1_R, 187.33462748878583, 81.3730734414022)
            Line((-0.1425600076744228, 1.107543631077695), (0, 0))
            ThreePointArc((0, 0), (0.5442029580032722, 0.00613747468079426), (1.088405916006544, -2e-17))
        make_face()
    fillet1_piece_19a = extrude(amount=23.111702270265507, mode=Mode.PRIVATE)
    fillet1_piece_19a = split(fillet1_piece_19a, bisect_by=Plane(origin=(-5.169208228517128, -2.7811177364302493, -10.159999999999997), z_dir=(0, 0, -1)), keep=Keep.TOP, mode=Mode.PRIVATE)
    with BuildSketch(Plane(origin=(19.049999999999997, 0, -10.159999999999997), x_dir=(-0.9720378558927297, -0.23482420384505664, 0), z_dir=(0.23482420384505664, -0.9720378558927297, 0))) as fillet1_piece_19b_section:
        with BuildLine():
            CenterArc((24.129999999999995 + FILLET1_R, FILLET1_R), FILLET1_R, 180, 90)
            Line((24.129999999999995 + FILLET1_R, 0), (24.129999999999995, 0))
            Line((24.129999999999995, 0), (24.129999999999995, FILLET1_R))
        make_face()
    fillet1_piece_19b = revolve(axis=Axis((19.049999999999997, 0, -10.159999999999997), (0, 0, -1)), revolution_arc=13.581260422554445, mode=Mode.PRIVATE)
    fillet1_piece_19b = split(fillet1_piece_19b, bisect_by=Plane(origin=(-5.000706985946903, -2.539999999999996, -10.444279944253614), z_dir=(1.5e-16, -1, 0)), keep=Keep.TOP, mode=Mode.PRIVATE)
    fillet1_piece_19 = fillet1_piece_19a & fillet1_piece_19b
    add(fillet1_piece_19)
    with BuildSketch(Plane(origin=(-4.945943407167803, 2.5399999999999956, -12.448297729734556), x_dir=(-1, 0, 0), z_dir=(0, 0, -1))) as fillet1_piece_20a_section:
        with BuildLine():
            CenterArc((1.1166809081061828, 1.27), FILLET1_R, 188.62692655867798, 81.37307344132205)
            ThreePointArc((-0.13895030765742877, 1.0795000000000146), (-0.06338789923047727, 0.5405335348765479), (0, 0))
            Line((0, 0), (1.1166809081061828, 0))
        make_face()
    fillet1_piece_20a = extrude(amount=6.601702270265445, mode=Mode.PRIVATE)
    fillet1_piece_20a = split(fillet1_piece_20a, bisect_by=Plane(origin=(-5.169208228517213, 2.781117736431371, -15.239999999999998), z_dir=(0, 0, 1)), keep=Keep.TOP, mode=Mode.PRIVATE)
    with BuildSketch(Plane(origin=(19.049999999999997, 0, -15.239999999999998), x_dir=(-1, 0, 0), z_dir=(0, -1, 0))) as fillet1_piece_20b_section:
        with BuildLine():
            CenterArc((24.13 + FILLET1_R, -FILLET1_R), FILLET1_R, 90, 90)
            Line((24.13 + FILLET1_R, 0), (24.13, 0))
            Line((24.13, 0), (24.13, -FILLET1_R))
        make_face()
    fillet1_piece_20b = revolve(axis=Axis((19.049999999999997, 0, -15.239999999999998), (0, 0, -1)), revolution_arc=13.581260422554415, mode=Mode.PRIVATE)
    fillet1_piece_20b = split(fillet1_piece_20b, bisect_by=Plane(origin=(-5.000706512259434, 2.5399999999999956, -14.955719927842756), z_dir=(8e-17, 1, 0)), keep=Keep.TOP, mode=Mode.PRIVATE)
    fillet1_piece_20 = fillet1_piece_20a & fillet1_piece_20b
    add(fillet1_piece_20)
    with BuildSketch(Plane(origin=(-4.945943407167807, -2.539999999999996, 19.05), x_dir=(0.12766405034714182, -0.9918174682112442, 0), z_dir=(0, 0, -1))) as fillet1_piece_21a_section:
        with BuildLine():
            CenterArc((1.1170481769540845, 1.2696769750168004), FILLET1_R, 187.33462748878583, 81.3730734414022)
            Line((-0.1425600076744228, 1.107543631077695), (0, 0))
            ThreePointArc((0, 0), (0.5442029580032722, 0.00613747468079426), (1.088405916006544, -2e-17))
        make_face()
    fillet1_piece_21a = extrude(amount=6.601702270265513, mode=Mode.PRIVATE)
    fillet1_piece_21a = split(fillet1_piece_21a, bisect_by=Plane(origin=(-5.169208228517128, -2.7811177364302497, 15.239999999999998), z_dir=(0, 0, -1)), keep=Keep.TOP, mode=Mode.PRIVATE)
    with BuildSketch(Plane(origin=(19.049999999999997, 0, 15.239999999999998), x_dir=(-0.9720378558927298, -0.23482420384505664, 0), z_dir=(0.23482420384505664, -0.9720378558927298, 0))) as fillet1_piece_21b_section:
        with BuildLine():
            CenterArc((24.130000000000003 + FILLET1_R, FILLET1_R), FILLET1_R, 180, 90)
            Line((24.130000000000003 + FILLET1_R, 0), (24.130000000000003, 0))
            Line((24.130000000000003, 0), (24.130000000000003, FILLET1_R))
        make_face()
    fillet1_piece_21b = revolve(axis=Axis((19.049999999999997, 0, 15.239999999999998), (0, 0, -1)), revolution_arc=13.581260422554445, mode=Mode.PRIVATE)
    fillet1_piece_21b = split(fillet1_piece_21b, bisect_by=Plane(origin=(-5.00070698594691, -2.539999999999996, 14.955720055746385), z_dir=(1.5e-16, -1, 0)), keep=Keep.TOP, mode=Mode.PRIVATE)
    fillet1_piece_21 = fillet1_piece_21a & fillet1_piece_21b
    add(fillet1_piece_21)
    with BuildSketch(Plane(origin=(-4.945943407167803, 2.5399999999999956, 12.951702270265438), x_dir=(-1, 0, 0), z_dir=(0, 0, -1))) as fillet1_piece_22a_section:
        with BuildLine():
            CenterArc((1.1166809081061828, 1.27), FILLET1_R, 188.62692655867798, 81.37307344132205)
            ThreePointArc((-0.13895030765742877, 1.0795000000000146), (-0.06338789923047727, 0.5405335348765479), (0, 0))
            Line((0, 0), (1.1166809081061828, 0))
        make_face()
    fillet1_piece_22a = extrude(amount=23.111702270265432, mode=Mode.PRIVATE)
    fillet1_piece_22a = split(fillet1_piece_22a, bisect_by=Plane(origin=(-5.169208228517213, 2.7811177364313715, 10.159999999999995), z_dir=(0, 0, 1)), keep=Keep.TOP, mode=Mode.PRIVATE)
    with BuildSketch(Plane(origin=(19.049999999999997, 0, 10.159999999999997), x_dir=(-1, 0, 0), z_dir=(0, -1, 0))) as fillet1_piece_22b_section:
        with BuildLine():
            CenterArc((24.13 + FILLET1_R, -FILLET1_R), FILLET1_R, 90, 90)
            Line((24.13 + FILLET1_R, 0), (24.13, 0))
            Line((24.13, 0), (24.13, -FILLET1_R))
        make_face()
    fillet1_piece_22b = revolve(axis=Axis((19.049999999999997, 0, 10.159999999999997), (0, 0, -1)), revolution_arc=13.581260422554415, mode=Mode.PRIVATE)
    fillet1_piece_22b = split(fillet1_piece_22b, bisect_by=Plane(origin=(-5.000706512259434, 2.5399999999999956, 10.444280072157238), z_dir=(8e-17, 1, 0)), keep=Keep.TOP, mode=Mode.PRIVATE)
    fillet1_piece_22 = fillet1_piece_22a & fillet1_piece_22b
    add(fillet1_piece_22)
    with BuildSketch(Plane(origin=(-4.9459434071678094, 2.5399999999999956, 10.159999999999997), x_dir=(-1, 0, 0), z_dir=(0, 0, -1))) as fillet1_piece_23a_section:
        with BuildLine():
            CenterArc((1.1166809081061766, 1.27), FILLET1_R, 188.62692655867798, 81.37307344132205)
            ThreePointArc((-0.138950307657435, 1.0795000000000146), (-0.06338789923048704, 0.5405335348765443), (0, 0))
            Line((0, 0), (1.1166809081061766, 0))
        make_face()
    fillet1_piece_23a = extrude(amount=23.111702270265436, mode=Mode.PRIVATE)
    fillet1_piece_23a = split(fillet1_piece_23a, bisect_by=Plane(origin=(-5.169208228517217, 2.781117736431367, -10.159999999999997), z_dir=(0, 0, -1)), keep=Keep.TOP, mode=Mode.PRIVATE)
    with BuildSketch(Plane(origin=(19.049999999999997, 0, -10.159999999999997), x_dir=(-1, 0, 0), z_dir=(0, -1, 0))) as fillet1_piece_23b_section:
        with BuildLine():
            CenterArc((24.129999999999995 + FILLET1_R, FILLET1_R), FILLET1_R, 180, 89.99999999999983)
            Line((24.129999999999995 + FILLET1_R, 0), (24.129999999999995, 0))
            Line((24.129999999999995, 0), (24.13, FILLET1_R))
        make_face()
    fillet1_piece_23b = revolve(axis=Axis((19.049999999999997, 0, -10.159999999999997), (0, 0, -1)), revolution_arc=13.581260422554427, mode=Mode.PRIVATE)
    fillet1_piece_23b = split(fillet1_piece_23b, bisect_by=Plane(origin=(-5.000706512259427, 2.5399999999999956, -10.44428007215724), z_dir=(8e-17, 1, 0)), keep=Keep.TOP, mode=Mode.PRIVATE)
    fillet1_piece_23 = fillet1_piece_23a & fillet1_piece_23b
    add(fillet1_piece_23)
    with BuildSketch(Plane(origin=(-4.945943407167807, -2.539999999999996, -12.448297729734488), x_dir=(0.12766405034714182, -0.9918174682112442, 0), z_dir=(0, 0, -1))) as fillet1_piece_24a_section:
        with BuildLine():
            CenterArc((1.1170481769540845, 1.2696769750168004), FILLET1_R, 187.33462748878583, 81.3730734414022)
            Line((-0.1425600076744228, 1.107543631077695), (0, 0))
            ThreePointArc((0, 0), (0.5442029580032722, 0.00613747468079426), (1.088405916006544, -2e-17))
        make_face()
    fillet1_piece_24a = extrude(amount=6.601702270265513, mode=Mode.PRIVATE)
    fillet1_piece_24a = split(fillet1_piece_24a, bisect_by=Plane(origin=(-5.169208228517128, -2.7811177364302524, -15.239999999999998), z_dir=(0, 0, 1)), keep=Keep.TOP, mode=Mode.PRIVATE)
    with BuildSketch(Plane(origin=(19.049999999999997, 0, -15.239999999999998), x_dir=(-0.97203785589273, -0.23482420384505578, 0), z_dir=(0.23482420384505578, -0.97203785589273, 0))) as fillet1_piece_24b_section:
        with BuildLine():
            CenterArc((24.130000000000003 + FILLET1_R, -FILLET1_R), FILLET1_R, 90, 90)
            Line((24.130000000000003 + FILLET1_R, 0), (24.130000000000003, 0))
            Line((24.130000000000003, 0), (24.130000000000003, -FILLET1_R))
        make_face()
    fillet1_piece_24b = revolve(axis=Axis((19.049999999999997, 0, -15.239999999999998), (0, 0, -1)), revolution_arc=13.581260422554433, mode=Mode.PRIVATE)
    fillet1_piece_24b = split(fillet1_piece_24b, bisect_by=Plane(origin=(-5.000706985946908, -2.539999999999996, -14.955720055746387), z_dir=(1.5e-16, -1, 0)), keep=Keep.TOP, mode=Mode.PRIVATE)
    fillet1_piece_24 = fillet1_piece_24a & fillet1_piece_24b
    add(fillet1_piece_24)


solid = part.part
